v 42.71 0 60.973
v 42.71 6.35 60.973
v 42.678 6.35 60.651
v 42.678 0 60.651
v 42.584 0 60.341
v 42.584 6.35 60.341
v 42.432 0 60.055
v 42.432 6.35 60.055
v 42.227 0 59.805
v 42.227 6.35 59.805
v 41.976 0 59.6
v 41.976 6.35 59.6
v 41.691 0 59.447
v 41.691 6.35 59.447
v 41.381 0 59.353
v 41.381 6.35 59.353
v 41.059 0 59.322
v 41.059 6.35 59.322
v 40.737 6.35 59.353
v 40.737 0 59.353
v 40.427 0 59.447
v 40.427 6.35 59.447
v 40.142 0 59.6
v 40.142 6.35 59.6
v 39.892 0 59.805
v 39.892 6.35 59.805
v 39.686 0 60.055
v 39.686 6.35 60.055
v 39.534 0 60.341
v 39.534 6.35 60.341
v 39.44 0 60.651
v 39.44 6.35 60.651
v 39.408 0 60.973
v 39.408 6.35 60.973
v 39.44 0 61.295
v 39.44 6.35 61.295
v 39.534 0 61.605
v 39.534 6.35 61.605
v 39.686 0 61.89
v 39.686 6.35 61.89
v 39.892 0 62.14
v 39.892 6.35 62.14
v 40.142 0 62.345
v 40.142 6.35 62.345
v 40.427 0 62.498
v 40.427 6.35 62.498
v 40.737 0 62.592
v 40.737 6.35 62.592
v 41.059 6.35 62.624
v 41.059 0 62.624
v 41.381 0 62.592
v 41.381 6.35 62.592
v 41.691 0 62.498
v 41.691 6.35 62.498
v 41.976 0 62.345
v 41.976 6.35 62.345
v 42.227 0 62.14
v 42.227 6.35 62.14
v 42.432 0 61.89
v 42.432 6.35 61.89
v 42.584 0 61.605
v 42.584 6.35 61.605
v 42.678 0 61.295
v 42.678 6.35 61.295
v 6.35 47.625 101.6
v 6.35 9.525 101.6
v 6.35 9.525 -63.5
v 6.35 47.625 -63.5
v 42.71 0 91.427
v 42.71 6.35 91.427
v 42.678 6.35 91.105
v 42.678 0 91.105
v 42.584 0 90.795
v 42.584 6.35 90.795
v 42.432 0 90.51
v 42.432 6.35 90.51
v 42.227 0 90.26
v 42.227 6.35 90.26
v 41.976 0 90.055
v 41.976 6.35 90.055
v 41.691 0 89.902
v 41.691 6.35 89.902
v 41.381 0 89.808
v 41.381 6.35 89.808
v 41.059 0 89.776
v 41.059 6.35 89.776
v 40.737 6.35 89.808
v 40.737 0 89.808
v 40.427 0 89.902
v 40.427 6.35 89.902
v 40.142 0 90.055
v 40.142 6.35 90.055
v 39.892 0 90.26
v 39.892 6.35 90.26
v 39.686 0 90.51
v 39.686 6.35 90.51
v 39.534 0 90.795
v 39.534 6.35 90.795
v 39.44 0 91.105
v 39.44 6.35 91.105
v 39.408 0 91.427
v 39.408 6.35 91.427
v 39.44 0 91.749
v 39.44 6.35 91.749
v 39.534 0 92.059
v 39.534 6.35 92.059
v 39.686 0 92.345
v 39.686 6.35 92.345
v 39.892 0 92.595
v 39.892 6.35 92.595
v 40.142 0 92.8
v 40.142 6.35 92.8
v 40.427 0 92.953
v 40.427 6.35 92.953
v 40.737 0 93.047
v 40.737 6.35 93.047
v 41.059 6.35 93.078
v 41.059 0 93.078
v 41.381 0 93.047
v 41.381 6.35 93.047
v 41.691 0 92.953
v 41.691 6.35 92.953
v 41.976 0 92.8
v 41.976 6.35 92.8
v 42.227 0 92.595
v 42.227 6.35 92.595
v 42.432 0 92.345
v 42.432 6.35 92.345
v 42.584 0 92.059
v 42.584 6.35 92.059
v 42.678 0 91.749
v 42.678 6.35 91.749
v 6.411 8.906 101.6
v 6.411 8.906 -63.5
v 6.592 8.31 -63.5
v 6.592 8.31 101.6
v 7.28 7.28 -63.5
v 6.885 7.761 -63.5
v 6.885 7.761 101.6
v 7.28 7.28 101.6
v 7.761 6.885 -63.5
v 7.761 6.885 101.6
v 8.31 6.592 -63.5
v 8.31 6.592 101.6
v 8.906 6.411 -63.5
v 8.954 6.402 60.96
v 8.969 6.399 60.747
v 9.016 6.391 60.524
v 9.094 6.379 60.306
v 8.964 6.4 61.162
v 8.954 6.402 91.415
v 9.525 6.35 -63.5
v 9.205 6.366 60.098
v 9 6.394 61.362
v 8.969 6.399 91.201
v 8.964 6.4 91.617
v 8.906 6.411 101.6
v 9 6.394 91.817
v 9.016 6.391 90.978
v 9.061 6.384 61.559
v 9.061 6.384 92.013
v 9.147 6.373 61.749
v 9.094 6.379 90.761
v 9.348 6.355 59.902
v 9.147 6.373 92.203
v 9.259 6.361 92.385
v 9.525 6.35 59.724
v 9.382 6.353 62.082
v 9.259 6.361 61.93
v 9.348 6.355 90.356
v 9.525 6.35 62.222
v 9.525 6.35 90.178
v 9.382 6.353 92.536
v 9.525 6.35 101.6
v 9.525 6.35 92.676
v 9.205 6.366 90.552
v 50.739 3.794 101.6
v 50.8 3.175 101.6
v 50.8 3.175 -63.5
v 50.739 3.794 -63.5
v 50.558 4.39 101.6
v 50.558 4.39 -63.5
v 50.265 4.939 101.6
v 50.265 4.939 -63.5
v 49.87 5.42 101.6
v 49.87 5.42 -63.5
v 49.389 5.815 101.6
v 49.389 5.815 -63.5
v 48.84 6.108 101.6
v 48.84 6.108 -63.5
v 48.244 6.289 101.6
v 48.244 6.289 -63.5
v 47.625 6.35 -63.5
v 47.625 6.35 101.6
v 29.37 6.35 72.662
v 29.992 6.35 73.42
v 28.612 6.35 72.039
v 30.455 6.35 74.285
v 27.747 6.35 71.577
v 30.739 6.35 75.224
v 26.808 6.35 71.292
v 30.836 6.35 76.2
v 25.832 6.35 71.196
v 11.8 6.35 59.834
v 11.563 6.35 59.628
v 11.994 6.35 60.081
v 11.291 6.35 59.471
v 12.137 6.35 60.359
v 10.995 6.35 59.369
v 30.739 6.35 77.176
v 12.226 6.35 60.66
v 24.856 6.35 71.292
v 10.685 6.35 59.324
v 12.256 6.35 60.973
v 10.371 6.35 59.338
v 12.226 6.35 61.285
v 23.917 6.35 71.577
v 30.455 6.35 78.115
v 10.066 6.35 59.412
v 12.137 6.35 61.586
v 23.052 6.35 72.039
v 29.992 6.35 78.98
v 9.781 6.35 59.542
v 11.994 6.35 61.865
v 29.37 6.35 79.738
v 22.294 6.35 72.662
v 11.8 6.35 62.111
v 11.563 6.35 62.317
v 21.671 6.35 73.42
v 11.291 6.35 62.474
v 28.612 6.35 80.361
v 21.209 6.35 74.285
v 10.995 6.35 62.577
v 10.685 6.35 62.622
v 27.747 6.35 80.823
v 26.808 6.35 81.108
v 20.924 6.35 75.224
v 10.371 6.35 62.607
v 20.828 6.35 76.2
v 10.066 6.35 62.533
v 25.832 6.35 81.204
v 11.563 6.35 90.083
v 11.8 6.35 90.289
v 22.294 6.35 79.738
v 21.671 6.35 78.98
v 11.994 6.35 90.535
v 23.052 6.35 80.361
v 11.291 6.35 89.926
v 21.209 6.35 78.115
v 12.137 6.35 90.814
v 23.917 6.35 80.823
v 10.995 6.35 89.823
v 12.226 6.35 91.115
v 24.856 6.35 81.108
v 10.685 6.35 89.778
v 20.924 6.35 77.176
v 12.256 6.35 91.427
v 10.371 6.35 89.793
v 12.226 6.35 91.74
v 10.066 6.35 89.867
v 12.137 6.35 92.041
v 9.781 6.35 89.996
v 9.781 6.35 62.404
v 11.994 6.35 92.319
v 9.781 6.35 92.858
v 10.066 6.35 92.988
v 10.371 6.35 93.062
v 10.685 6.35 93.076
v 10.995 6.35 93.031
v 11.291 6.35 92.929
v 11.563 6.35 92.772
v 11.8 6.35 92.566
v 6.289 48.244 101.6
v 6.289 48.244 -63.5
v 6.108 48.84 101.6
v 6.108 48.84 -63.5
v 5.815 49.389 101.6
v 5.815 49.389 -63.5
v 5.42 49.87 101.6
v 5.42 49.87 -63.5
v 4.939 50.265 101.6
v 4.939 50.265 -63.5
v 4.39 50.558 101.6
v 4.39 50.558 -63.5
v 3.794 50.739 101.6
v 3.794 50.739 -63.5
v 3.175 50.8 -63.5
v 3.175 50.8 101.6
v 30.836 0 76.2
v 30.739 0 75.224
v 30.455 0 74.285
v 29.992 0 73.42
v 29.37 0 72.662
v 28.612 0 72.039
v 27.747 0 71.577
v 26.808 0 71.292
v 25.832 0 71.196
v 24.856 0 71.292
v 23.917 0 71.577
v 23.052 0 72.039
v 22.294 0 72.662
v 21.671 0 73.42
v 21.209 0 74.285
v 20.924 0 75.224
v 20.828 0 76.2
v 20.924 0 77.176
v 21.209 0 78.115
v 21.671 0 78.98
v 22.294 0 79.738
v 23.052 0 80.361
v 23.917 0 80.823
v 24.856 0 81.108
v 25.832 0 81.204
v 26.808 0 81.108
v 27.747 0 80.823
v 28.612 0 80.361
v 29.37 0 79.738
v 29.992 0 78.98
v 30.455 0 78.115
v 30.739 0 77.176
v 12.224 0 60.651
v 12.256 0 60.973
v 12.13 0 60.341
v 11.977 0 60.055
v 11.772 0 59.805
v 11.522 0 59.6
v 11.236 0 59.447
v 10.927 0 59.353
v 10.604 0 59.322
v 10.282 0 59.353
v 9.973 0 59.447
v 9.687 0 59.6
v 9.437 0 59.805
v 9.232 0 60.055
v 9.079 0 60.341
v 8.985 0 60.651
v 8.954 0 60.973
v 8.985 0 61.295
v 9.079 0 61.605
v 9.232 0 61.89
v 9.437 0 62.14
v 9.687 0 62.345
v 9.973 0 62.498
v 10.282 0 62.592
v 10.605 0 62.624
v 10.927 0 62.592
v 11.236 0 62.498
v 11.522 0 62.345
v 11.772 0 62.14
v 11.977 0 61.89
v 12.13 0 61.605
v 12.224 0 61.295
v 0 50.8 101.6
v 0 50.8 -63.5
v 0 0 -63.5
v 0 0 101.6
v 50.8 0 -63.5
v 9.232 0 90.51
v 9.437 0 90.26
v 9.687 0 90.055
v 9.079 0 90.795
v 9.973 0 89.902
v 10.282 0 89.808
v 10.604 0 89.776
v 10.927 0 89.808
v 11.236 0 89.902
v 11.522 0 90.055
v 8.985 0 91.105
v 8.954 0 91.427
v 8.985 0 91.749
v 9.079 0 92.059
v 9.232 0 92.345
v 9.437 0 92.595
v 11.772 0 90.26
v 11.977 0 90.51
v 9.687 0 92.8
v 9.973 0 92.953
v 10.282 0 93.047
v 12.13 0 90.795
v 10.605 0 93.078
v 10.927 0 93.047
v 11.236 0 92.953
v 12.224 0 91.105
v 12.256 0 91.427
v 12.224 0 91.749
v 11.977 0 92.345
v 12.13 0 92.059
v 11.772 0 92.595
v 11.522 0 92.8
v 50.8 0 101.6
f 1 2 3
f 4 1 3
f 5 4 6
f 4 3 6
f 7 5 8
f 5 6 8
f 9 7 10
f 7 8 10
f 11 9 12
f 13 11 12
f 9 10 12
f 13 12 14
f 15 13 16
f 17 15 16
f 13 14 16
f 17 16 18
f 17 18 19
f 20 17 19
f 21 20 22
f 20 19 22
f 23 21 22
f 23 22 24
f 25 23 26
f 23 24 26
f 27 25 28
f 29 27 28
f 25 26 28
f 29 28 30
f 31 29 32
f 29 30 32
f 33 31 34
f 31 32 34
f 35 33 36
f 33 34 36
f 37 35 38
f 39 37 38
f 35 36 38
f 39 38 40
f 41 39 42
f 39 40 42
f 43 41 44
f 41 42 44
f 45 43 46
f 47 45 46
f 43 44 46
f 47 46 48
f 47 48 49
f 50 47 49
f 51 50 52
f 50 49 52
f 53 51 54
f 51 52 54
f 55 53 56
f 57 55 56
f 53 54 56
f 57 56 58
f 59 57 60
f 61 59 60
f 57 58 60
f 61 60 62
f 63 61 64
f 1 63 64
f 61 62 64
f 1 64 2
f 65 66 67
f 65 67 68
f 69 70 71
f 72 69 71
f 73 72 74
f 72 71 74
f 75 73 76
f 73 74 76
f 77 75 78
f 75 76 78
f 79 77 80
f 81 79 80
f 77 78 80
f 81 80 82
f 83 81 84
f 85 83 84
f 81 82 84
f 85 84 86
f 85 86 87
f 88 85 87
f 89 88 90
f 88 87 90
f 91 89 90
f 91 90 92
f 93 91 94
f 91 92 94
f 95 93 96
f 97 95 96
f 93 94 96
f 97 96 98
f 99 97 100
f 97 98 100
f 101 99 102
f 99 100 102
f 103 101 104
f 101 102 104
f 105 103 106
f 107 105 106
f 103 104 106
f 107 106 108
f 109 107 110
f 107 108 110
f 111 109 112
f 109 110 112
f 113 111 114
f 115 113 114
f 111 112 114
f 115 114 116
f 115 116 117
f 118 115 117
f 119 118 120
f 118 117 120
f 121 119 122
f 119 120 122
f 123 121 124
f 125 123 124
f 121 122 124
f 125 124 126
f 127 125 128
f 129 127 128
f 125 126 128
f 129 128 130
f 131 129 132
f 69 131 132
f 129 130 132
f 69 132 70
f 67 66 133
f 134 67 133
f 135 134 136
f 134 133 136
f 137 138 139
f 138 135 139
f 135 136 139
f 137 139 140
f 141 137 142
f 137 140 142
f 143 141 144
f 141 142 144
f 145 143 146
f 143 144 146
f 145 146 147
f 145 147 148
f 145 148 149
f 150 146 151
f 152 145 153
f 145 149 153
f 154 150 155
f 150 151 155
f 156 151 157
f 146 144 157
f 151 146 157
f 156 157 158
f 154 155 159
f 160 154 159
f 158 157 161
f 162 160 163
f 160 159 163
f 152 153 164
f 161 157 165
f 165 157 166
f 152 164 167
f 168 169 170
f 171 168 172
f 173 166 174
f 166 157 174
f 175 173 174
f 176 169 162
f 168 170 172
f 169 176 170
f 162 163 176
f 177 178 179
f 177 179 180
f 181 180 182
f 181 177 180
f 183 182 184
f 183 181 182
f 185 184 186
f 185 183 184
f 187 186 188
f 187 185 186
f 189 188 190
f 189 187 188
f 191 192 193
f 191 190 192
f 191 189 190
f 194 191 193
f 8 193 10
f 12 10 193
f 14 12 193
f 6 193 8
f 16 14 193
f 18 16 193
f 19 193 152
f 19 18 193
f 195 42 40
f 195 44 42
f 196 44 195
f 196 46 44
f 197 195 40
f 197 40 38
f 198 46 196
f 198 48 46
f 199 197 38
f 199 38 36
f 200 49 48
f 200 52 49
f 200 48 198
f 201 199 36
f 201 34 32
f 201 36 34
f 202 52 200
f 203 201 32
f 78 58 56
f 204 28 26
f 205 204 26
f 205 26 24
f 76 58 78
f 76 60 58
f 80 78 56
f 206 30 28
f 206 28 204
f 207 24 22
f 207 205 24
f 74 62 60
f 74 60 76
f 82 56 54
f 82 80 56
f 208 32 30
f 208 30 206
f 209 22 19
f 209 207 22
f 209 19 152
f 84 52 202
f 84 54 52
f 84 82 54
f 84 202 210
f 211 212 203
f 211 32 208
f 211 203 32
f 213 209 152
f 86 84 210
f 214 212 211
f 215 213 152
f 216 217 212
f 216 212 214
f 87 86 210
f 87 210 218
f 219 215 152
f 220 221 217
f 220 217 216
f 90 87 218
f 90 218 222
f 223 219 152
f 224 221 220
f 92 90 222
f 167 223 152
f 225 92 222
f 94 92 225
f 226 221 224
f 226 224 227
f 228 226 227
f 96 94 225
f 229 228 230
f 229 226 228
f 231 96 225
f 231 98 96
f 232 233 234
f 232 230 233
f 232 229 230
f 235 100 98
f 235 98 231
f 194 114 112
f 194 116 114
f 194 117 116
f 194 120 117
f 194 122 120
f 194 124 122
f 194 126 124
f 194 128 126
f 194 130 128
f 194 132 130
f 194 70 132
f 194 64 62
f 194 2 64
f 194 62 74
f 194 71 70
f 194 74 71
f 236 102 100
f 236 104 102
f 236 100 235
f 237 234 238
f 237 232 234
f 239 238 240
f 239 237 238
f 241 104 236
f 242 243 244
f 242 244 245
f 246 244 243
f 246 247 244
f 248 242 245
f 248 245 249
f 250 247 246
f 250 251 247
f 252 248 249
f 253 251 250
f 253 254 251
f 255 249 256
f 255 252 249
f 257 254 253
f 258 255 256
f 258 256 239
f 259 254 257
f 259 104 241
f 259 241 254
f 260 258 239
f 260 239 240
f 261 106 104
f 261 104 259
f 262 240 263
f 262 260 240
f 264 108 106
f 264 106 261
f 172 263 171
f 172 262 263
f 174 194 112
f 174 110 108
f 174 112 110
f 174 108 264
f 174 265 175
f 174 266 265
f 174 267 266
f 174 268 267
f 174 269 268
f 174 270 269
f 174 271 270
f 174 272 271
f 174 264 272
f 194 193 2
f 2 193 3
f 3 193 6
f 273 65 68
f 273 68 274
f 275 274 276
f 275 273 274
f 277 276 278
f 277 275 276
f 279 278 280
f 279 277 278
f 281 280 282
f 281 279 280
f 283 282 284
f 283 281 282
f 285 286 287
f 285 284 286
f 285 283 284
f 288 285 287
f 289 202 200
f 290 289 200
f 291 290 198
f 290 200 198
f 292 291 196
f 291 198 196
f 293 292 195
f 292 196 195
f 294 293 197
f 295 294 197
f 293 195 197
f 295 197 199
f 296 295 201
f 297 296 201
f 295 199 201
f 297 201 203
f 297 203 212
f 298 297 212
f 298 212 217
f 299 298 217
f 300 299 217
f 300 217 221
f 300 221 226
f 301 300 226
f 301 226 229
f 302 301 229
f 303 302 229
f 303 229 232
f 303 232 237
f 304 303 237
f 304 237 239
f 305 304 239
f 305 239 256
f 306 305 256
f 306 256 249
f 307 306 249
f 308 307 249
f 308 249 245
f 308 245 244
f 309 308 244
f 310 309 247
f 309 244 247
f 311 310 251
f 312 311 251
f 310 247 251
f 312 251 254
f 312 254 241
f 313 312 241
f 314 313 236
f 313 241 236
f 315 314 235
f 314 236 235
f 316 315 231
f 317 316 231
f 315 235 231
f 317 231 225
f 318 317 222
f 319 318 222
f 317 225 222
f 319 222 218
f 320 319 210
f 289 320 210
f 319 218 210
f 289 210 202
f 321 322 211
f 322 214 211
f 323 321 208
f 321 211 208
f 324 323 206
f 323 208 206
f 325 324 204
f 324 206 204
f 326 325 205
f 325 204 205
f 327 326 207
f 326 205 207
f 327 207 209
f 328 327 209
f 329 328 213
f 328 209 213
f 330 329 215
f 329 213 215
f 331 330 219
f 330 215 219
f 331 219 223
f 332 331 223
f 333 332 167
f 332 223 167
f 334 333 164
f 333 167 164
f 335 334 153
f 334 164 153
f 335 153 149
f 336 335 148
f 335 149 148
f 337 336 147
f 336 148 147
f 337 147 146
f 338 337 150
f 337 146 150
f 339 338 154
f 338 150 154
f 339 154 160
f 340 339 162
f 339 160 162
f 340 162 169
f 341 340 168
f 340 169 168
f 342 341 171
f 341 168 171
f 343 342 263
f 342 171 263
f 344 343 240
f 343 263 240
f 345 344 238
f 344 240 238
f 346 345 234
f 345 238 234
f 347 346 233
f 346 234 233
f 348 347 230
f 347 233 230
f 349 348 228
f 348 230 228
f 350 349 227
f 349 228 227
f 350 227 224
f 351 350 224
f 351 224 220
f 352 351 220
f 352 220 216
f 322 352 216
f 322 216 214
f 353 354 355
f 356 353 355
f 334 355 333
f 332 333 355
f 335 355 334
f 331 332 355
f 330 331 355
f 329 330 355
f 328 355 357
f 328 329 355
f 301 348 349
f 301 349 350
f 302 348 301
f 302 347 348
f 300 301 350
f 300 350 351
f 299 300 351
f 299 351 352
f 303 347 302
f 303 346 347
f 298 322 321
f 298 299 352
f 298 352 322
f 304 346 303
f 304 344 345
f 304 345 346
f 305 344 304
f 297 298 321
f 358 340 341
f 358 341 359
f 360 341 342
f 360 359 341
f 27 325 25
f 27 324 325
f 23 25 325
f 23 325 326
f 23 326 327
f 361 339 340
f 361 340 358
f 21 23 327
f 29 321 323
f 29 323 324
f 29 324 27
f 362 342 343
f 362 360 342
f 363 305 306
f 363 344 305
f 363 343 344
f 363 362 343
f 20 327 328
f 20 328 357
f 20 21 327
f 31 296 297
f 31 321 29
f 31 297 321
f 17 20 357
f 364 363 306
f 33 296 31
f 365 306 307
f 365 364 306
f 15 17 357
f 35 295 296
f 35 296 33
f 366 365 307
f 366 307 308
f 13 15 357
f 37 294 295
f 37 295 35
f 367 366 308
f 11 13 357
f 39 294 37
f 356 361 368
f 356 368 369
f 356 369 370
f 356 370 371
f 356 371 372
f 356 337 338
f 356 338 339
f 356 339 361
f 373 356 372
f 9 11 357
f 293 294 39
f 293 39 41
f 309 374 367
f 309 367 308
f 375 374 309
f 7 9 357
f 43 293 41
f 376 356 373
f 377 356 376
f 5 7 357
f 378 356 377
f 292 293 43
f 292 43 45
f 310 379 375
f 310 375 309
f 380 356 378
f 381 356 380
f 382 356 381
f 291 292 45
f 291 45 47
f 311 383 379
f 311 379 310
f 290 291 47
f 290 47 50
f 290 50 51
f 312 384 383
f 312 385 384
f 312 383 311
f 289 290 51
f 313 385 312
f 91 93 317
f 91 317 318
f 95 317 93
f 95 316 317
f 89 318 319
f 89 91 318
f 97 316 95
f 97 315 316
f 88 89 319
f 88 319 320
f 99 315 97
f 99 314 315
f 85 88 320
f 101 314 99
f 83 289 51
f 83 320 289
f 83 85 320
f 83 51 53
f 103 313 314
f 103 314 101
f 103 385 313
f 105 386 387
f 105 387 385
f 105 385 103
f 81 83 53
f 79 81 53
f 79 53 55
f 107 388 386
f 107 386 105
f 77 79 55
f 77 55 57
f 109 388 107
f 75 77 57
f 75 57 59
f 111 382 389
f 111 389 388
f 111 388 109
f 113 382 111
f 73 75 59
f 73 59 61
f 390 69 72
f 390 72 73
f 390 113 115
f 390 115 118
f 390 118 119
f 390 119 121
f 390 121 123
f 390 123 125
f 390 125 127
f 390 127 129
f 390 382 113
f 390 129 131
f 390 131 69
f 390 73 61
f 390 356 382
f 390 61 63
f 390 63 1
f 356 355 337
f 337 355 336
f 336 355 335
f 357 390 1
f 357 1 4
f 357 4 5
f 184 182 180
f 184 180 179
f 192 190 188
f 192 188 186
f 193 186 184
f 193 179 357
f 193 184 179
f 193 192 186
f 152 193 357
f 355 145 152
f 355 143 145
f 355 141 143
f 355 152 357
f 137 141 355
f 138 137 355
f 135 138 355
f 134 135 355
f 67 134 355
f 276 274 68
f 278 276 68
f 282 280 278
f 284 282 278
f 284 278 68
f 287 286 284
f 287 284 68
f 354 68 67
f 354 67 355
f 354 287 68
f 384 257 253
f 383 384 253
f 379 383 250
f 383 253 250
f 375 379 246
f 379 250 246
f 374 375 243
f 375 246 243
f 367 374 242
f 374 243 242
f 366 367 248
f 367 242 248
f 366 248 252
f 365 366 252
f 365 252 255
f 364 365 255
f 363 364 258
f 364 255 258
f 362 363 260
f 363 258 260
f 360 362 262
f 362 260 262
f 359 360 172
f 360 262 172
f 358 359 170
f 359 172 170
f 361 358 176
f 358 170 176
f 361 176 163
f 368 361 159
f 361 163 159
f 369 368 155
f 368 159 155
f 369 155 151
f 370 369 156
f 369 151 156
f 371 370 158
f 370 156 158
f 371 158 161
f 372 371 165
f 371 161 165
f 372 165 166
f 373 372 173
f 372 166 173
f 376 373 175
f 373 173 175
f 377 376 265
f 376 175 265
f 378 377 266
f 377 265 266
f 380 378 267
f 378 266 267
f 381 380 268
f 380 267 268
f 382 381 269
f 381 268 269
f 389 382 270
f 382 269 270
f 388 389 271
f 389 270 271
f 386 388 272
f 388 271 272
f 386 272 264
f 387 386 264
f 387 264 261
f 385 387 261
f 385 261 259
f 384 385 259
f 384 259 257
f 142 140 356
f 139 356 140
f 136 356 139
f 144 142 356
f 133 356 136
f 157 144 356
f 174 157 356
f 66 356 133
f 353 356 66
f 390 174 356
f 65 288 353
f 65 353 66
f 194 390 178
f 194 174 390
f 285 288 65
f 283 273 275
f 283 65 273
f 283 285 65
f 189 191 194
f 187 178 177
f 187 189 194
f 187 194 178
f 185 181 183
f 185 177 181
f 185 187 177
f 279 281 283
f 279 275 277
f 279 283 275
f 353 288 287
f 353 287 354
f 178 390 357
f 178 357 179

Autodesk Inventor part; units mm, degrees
ref_plane "YZ Plane" through (0, 0, 0) normal (1, 0, 0) x (0, 1, 0)
ref_plane "XZ Plane" through (0, 0, 0) normal (0, 1, 0) x (-1, 0, 0)
ref_plane "XY Plane" through (0, 0, 0) normal (0, 0, 1) x (1, 0, 0)
sketch "Sketch1" plane through (0, 0, 0) normal (0, 0, 1) x (1, 0, 0)
  line L0 (0, 0) -> (0, 50.8)
  line L1 (0, 0) -> (50.8, 0)
  line L2 (0, 50.8) -> (6.35, 50.8)
  line L3 (6.35, 50.8) -> (6.35, 0)
  line L4 (6.35, 0) -> (0, 0)
  line L5 (0, 0) -> (0, 50.8)
  line L6 (0, 0) -> (50.8, 0)
  line L7 (50.8, 0) -> (50.8, 6.35)
  line L8 (50.8, 6.35) -> (0, 6.35)
  line L9 (0, 6.35) -> (0, 0)
  dimension "d0" = 50.8
  dimension "d1" = 50.8
  dimension "d2" = 6.35
  dimension "d3" = 6.35
extrude "Extrusion1" add sketch "Sketch1" along normal blind 101.6
fillet "Fillet1" radius 3.175 1 edges at (6.35, 50.8, 50.8)
fillet "Fillet2" radius 3.175 1 edges at (50.8, 6.35, 50.8)
fillet "Fillet3" radius 3.175 1 edges at (6.35, 6.35, 50.8)
sketch "Sketch2" plane through (47.625, 6.35, 101.6) normal (0, 1, 0) x (1, 0, 0)
  circle A0 centre (-21.7932, 25.4) radius 5.0038
  line L0 (-47.625, 50.8) -> (-47.625, 101.6)
  line L1 (-47.625, 101.6) -> (-73.025, 101.6)
  line L2 (-73.025, 101.6) -> (-73.025, 0)
  line L3 (-73.025, 0) -> (3.6068, 0)
  line L4 (3.6068, 0) -> (3.6068, 50.8)
  line L5 (3.6068, 50.8) -> (-45.308, 50.8)
  line L6 (-45.308, 101.6) -> (-45.308, 50.8)
  line L7 (-45.4152, 101.6) -> (-45.308, 101.6)
  line L8 (-45.4152, 50.8) -> (-45.4152, 101.6)
  line L9 (-45.4152, 50.8) -> (-47.5178, 50.8)
  line L10 (-47.5178, 50.8) -> (-47.625, 50.8)
  circle A1 centre (-6.5659, 40.6273) radius 1.651
  circle A2 centre (-6.5659, 10.1727) radius 1.651
  circle A3 centre (-37.0205, 10.1727) radius 1.651
  circle A4 centre (-37.0205, 40.6273) radius 1.651
  line L11 (-38.1, 0) -> (-38.1, 101.6)
  line L12 (0, 0) -> (-38.1, 0)
  line L13 (0, 101.6) -> (0, 0)
  line L14 (0, 101.6) -> (-38.1, 101.6)
extrude "Extrusion2" cut sketch "Sketch2" along normal mid plane 25.4 contours A0 | L11 A3 | A3 L11 | L11 A4 | A4 L11 | A1 | A2
sketch "Sketch3" plane through (0, 0, 0) normal (0, 0, -1) x (-1, 0, 0)
  arc A0 (-47.625, 6.35) -> (-50.8, 3.175) centre (-47.625, 3.175) ccw
  line L0 (-50.8, 0) -> (-50.8, 3.175)
  line L1 (0, 0) -> (-50.8, 0)
  line L2 (0, 50.8) -> (0, 0)
  line L3 (-3.175, 50.8) -> (0, 50.8)
  arc A1 (-3.175, 50.8) -> (-6.35, 47.625) centre (-3.175, 47.625) ccw
  line L4 (-6.35, 9.525) -> (-6.35, 47.625)
  arc A2 (-9.525, 6.35) -> (-6.35, 9.525) centre (-9.525, 9.525) ccw
  line L5 (-47.625, 6.35) -> (-9.525, 6.35)
extrude "Extrusion3" add sketch "Sketch3" along normal blind 63.5
properties part number "L beam concept"
